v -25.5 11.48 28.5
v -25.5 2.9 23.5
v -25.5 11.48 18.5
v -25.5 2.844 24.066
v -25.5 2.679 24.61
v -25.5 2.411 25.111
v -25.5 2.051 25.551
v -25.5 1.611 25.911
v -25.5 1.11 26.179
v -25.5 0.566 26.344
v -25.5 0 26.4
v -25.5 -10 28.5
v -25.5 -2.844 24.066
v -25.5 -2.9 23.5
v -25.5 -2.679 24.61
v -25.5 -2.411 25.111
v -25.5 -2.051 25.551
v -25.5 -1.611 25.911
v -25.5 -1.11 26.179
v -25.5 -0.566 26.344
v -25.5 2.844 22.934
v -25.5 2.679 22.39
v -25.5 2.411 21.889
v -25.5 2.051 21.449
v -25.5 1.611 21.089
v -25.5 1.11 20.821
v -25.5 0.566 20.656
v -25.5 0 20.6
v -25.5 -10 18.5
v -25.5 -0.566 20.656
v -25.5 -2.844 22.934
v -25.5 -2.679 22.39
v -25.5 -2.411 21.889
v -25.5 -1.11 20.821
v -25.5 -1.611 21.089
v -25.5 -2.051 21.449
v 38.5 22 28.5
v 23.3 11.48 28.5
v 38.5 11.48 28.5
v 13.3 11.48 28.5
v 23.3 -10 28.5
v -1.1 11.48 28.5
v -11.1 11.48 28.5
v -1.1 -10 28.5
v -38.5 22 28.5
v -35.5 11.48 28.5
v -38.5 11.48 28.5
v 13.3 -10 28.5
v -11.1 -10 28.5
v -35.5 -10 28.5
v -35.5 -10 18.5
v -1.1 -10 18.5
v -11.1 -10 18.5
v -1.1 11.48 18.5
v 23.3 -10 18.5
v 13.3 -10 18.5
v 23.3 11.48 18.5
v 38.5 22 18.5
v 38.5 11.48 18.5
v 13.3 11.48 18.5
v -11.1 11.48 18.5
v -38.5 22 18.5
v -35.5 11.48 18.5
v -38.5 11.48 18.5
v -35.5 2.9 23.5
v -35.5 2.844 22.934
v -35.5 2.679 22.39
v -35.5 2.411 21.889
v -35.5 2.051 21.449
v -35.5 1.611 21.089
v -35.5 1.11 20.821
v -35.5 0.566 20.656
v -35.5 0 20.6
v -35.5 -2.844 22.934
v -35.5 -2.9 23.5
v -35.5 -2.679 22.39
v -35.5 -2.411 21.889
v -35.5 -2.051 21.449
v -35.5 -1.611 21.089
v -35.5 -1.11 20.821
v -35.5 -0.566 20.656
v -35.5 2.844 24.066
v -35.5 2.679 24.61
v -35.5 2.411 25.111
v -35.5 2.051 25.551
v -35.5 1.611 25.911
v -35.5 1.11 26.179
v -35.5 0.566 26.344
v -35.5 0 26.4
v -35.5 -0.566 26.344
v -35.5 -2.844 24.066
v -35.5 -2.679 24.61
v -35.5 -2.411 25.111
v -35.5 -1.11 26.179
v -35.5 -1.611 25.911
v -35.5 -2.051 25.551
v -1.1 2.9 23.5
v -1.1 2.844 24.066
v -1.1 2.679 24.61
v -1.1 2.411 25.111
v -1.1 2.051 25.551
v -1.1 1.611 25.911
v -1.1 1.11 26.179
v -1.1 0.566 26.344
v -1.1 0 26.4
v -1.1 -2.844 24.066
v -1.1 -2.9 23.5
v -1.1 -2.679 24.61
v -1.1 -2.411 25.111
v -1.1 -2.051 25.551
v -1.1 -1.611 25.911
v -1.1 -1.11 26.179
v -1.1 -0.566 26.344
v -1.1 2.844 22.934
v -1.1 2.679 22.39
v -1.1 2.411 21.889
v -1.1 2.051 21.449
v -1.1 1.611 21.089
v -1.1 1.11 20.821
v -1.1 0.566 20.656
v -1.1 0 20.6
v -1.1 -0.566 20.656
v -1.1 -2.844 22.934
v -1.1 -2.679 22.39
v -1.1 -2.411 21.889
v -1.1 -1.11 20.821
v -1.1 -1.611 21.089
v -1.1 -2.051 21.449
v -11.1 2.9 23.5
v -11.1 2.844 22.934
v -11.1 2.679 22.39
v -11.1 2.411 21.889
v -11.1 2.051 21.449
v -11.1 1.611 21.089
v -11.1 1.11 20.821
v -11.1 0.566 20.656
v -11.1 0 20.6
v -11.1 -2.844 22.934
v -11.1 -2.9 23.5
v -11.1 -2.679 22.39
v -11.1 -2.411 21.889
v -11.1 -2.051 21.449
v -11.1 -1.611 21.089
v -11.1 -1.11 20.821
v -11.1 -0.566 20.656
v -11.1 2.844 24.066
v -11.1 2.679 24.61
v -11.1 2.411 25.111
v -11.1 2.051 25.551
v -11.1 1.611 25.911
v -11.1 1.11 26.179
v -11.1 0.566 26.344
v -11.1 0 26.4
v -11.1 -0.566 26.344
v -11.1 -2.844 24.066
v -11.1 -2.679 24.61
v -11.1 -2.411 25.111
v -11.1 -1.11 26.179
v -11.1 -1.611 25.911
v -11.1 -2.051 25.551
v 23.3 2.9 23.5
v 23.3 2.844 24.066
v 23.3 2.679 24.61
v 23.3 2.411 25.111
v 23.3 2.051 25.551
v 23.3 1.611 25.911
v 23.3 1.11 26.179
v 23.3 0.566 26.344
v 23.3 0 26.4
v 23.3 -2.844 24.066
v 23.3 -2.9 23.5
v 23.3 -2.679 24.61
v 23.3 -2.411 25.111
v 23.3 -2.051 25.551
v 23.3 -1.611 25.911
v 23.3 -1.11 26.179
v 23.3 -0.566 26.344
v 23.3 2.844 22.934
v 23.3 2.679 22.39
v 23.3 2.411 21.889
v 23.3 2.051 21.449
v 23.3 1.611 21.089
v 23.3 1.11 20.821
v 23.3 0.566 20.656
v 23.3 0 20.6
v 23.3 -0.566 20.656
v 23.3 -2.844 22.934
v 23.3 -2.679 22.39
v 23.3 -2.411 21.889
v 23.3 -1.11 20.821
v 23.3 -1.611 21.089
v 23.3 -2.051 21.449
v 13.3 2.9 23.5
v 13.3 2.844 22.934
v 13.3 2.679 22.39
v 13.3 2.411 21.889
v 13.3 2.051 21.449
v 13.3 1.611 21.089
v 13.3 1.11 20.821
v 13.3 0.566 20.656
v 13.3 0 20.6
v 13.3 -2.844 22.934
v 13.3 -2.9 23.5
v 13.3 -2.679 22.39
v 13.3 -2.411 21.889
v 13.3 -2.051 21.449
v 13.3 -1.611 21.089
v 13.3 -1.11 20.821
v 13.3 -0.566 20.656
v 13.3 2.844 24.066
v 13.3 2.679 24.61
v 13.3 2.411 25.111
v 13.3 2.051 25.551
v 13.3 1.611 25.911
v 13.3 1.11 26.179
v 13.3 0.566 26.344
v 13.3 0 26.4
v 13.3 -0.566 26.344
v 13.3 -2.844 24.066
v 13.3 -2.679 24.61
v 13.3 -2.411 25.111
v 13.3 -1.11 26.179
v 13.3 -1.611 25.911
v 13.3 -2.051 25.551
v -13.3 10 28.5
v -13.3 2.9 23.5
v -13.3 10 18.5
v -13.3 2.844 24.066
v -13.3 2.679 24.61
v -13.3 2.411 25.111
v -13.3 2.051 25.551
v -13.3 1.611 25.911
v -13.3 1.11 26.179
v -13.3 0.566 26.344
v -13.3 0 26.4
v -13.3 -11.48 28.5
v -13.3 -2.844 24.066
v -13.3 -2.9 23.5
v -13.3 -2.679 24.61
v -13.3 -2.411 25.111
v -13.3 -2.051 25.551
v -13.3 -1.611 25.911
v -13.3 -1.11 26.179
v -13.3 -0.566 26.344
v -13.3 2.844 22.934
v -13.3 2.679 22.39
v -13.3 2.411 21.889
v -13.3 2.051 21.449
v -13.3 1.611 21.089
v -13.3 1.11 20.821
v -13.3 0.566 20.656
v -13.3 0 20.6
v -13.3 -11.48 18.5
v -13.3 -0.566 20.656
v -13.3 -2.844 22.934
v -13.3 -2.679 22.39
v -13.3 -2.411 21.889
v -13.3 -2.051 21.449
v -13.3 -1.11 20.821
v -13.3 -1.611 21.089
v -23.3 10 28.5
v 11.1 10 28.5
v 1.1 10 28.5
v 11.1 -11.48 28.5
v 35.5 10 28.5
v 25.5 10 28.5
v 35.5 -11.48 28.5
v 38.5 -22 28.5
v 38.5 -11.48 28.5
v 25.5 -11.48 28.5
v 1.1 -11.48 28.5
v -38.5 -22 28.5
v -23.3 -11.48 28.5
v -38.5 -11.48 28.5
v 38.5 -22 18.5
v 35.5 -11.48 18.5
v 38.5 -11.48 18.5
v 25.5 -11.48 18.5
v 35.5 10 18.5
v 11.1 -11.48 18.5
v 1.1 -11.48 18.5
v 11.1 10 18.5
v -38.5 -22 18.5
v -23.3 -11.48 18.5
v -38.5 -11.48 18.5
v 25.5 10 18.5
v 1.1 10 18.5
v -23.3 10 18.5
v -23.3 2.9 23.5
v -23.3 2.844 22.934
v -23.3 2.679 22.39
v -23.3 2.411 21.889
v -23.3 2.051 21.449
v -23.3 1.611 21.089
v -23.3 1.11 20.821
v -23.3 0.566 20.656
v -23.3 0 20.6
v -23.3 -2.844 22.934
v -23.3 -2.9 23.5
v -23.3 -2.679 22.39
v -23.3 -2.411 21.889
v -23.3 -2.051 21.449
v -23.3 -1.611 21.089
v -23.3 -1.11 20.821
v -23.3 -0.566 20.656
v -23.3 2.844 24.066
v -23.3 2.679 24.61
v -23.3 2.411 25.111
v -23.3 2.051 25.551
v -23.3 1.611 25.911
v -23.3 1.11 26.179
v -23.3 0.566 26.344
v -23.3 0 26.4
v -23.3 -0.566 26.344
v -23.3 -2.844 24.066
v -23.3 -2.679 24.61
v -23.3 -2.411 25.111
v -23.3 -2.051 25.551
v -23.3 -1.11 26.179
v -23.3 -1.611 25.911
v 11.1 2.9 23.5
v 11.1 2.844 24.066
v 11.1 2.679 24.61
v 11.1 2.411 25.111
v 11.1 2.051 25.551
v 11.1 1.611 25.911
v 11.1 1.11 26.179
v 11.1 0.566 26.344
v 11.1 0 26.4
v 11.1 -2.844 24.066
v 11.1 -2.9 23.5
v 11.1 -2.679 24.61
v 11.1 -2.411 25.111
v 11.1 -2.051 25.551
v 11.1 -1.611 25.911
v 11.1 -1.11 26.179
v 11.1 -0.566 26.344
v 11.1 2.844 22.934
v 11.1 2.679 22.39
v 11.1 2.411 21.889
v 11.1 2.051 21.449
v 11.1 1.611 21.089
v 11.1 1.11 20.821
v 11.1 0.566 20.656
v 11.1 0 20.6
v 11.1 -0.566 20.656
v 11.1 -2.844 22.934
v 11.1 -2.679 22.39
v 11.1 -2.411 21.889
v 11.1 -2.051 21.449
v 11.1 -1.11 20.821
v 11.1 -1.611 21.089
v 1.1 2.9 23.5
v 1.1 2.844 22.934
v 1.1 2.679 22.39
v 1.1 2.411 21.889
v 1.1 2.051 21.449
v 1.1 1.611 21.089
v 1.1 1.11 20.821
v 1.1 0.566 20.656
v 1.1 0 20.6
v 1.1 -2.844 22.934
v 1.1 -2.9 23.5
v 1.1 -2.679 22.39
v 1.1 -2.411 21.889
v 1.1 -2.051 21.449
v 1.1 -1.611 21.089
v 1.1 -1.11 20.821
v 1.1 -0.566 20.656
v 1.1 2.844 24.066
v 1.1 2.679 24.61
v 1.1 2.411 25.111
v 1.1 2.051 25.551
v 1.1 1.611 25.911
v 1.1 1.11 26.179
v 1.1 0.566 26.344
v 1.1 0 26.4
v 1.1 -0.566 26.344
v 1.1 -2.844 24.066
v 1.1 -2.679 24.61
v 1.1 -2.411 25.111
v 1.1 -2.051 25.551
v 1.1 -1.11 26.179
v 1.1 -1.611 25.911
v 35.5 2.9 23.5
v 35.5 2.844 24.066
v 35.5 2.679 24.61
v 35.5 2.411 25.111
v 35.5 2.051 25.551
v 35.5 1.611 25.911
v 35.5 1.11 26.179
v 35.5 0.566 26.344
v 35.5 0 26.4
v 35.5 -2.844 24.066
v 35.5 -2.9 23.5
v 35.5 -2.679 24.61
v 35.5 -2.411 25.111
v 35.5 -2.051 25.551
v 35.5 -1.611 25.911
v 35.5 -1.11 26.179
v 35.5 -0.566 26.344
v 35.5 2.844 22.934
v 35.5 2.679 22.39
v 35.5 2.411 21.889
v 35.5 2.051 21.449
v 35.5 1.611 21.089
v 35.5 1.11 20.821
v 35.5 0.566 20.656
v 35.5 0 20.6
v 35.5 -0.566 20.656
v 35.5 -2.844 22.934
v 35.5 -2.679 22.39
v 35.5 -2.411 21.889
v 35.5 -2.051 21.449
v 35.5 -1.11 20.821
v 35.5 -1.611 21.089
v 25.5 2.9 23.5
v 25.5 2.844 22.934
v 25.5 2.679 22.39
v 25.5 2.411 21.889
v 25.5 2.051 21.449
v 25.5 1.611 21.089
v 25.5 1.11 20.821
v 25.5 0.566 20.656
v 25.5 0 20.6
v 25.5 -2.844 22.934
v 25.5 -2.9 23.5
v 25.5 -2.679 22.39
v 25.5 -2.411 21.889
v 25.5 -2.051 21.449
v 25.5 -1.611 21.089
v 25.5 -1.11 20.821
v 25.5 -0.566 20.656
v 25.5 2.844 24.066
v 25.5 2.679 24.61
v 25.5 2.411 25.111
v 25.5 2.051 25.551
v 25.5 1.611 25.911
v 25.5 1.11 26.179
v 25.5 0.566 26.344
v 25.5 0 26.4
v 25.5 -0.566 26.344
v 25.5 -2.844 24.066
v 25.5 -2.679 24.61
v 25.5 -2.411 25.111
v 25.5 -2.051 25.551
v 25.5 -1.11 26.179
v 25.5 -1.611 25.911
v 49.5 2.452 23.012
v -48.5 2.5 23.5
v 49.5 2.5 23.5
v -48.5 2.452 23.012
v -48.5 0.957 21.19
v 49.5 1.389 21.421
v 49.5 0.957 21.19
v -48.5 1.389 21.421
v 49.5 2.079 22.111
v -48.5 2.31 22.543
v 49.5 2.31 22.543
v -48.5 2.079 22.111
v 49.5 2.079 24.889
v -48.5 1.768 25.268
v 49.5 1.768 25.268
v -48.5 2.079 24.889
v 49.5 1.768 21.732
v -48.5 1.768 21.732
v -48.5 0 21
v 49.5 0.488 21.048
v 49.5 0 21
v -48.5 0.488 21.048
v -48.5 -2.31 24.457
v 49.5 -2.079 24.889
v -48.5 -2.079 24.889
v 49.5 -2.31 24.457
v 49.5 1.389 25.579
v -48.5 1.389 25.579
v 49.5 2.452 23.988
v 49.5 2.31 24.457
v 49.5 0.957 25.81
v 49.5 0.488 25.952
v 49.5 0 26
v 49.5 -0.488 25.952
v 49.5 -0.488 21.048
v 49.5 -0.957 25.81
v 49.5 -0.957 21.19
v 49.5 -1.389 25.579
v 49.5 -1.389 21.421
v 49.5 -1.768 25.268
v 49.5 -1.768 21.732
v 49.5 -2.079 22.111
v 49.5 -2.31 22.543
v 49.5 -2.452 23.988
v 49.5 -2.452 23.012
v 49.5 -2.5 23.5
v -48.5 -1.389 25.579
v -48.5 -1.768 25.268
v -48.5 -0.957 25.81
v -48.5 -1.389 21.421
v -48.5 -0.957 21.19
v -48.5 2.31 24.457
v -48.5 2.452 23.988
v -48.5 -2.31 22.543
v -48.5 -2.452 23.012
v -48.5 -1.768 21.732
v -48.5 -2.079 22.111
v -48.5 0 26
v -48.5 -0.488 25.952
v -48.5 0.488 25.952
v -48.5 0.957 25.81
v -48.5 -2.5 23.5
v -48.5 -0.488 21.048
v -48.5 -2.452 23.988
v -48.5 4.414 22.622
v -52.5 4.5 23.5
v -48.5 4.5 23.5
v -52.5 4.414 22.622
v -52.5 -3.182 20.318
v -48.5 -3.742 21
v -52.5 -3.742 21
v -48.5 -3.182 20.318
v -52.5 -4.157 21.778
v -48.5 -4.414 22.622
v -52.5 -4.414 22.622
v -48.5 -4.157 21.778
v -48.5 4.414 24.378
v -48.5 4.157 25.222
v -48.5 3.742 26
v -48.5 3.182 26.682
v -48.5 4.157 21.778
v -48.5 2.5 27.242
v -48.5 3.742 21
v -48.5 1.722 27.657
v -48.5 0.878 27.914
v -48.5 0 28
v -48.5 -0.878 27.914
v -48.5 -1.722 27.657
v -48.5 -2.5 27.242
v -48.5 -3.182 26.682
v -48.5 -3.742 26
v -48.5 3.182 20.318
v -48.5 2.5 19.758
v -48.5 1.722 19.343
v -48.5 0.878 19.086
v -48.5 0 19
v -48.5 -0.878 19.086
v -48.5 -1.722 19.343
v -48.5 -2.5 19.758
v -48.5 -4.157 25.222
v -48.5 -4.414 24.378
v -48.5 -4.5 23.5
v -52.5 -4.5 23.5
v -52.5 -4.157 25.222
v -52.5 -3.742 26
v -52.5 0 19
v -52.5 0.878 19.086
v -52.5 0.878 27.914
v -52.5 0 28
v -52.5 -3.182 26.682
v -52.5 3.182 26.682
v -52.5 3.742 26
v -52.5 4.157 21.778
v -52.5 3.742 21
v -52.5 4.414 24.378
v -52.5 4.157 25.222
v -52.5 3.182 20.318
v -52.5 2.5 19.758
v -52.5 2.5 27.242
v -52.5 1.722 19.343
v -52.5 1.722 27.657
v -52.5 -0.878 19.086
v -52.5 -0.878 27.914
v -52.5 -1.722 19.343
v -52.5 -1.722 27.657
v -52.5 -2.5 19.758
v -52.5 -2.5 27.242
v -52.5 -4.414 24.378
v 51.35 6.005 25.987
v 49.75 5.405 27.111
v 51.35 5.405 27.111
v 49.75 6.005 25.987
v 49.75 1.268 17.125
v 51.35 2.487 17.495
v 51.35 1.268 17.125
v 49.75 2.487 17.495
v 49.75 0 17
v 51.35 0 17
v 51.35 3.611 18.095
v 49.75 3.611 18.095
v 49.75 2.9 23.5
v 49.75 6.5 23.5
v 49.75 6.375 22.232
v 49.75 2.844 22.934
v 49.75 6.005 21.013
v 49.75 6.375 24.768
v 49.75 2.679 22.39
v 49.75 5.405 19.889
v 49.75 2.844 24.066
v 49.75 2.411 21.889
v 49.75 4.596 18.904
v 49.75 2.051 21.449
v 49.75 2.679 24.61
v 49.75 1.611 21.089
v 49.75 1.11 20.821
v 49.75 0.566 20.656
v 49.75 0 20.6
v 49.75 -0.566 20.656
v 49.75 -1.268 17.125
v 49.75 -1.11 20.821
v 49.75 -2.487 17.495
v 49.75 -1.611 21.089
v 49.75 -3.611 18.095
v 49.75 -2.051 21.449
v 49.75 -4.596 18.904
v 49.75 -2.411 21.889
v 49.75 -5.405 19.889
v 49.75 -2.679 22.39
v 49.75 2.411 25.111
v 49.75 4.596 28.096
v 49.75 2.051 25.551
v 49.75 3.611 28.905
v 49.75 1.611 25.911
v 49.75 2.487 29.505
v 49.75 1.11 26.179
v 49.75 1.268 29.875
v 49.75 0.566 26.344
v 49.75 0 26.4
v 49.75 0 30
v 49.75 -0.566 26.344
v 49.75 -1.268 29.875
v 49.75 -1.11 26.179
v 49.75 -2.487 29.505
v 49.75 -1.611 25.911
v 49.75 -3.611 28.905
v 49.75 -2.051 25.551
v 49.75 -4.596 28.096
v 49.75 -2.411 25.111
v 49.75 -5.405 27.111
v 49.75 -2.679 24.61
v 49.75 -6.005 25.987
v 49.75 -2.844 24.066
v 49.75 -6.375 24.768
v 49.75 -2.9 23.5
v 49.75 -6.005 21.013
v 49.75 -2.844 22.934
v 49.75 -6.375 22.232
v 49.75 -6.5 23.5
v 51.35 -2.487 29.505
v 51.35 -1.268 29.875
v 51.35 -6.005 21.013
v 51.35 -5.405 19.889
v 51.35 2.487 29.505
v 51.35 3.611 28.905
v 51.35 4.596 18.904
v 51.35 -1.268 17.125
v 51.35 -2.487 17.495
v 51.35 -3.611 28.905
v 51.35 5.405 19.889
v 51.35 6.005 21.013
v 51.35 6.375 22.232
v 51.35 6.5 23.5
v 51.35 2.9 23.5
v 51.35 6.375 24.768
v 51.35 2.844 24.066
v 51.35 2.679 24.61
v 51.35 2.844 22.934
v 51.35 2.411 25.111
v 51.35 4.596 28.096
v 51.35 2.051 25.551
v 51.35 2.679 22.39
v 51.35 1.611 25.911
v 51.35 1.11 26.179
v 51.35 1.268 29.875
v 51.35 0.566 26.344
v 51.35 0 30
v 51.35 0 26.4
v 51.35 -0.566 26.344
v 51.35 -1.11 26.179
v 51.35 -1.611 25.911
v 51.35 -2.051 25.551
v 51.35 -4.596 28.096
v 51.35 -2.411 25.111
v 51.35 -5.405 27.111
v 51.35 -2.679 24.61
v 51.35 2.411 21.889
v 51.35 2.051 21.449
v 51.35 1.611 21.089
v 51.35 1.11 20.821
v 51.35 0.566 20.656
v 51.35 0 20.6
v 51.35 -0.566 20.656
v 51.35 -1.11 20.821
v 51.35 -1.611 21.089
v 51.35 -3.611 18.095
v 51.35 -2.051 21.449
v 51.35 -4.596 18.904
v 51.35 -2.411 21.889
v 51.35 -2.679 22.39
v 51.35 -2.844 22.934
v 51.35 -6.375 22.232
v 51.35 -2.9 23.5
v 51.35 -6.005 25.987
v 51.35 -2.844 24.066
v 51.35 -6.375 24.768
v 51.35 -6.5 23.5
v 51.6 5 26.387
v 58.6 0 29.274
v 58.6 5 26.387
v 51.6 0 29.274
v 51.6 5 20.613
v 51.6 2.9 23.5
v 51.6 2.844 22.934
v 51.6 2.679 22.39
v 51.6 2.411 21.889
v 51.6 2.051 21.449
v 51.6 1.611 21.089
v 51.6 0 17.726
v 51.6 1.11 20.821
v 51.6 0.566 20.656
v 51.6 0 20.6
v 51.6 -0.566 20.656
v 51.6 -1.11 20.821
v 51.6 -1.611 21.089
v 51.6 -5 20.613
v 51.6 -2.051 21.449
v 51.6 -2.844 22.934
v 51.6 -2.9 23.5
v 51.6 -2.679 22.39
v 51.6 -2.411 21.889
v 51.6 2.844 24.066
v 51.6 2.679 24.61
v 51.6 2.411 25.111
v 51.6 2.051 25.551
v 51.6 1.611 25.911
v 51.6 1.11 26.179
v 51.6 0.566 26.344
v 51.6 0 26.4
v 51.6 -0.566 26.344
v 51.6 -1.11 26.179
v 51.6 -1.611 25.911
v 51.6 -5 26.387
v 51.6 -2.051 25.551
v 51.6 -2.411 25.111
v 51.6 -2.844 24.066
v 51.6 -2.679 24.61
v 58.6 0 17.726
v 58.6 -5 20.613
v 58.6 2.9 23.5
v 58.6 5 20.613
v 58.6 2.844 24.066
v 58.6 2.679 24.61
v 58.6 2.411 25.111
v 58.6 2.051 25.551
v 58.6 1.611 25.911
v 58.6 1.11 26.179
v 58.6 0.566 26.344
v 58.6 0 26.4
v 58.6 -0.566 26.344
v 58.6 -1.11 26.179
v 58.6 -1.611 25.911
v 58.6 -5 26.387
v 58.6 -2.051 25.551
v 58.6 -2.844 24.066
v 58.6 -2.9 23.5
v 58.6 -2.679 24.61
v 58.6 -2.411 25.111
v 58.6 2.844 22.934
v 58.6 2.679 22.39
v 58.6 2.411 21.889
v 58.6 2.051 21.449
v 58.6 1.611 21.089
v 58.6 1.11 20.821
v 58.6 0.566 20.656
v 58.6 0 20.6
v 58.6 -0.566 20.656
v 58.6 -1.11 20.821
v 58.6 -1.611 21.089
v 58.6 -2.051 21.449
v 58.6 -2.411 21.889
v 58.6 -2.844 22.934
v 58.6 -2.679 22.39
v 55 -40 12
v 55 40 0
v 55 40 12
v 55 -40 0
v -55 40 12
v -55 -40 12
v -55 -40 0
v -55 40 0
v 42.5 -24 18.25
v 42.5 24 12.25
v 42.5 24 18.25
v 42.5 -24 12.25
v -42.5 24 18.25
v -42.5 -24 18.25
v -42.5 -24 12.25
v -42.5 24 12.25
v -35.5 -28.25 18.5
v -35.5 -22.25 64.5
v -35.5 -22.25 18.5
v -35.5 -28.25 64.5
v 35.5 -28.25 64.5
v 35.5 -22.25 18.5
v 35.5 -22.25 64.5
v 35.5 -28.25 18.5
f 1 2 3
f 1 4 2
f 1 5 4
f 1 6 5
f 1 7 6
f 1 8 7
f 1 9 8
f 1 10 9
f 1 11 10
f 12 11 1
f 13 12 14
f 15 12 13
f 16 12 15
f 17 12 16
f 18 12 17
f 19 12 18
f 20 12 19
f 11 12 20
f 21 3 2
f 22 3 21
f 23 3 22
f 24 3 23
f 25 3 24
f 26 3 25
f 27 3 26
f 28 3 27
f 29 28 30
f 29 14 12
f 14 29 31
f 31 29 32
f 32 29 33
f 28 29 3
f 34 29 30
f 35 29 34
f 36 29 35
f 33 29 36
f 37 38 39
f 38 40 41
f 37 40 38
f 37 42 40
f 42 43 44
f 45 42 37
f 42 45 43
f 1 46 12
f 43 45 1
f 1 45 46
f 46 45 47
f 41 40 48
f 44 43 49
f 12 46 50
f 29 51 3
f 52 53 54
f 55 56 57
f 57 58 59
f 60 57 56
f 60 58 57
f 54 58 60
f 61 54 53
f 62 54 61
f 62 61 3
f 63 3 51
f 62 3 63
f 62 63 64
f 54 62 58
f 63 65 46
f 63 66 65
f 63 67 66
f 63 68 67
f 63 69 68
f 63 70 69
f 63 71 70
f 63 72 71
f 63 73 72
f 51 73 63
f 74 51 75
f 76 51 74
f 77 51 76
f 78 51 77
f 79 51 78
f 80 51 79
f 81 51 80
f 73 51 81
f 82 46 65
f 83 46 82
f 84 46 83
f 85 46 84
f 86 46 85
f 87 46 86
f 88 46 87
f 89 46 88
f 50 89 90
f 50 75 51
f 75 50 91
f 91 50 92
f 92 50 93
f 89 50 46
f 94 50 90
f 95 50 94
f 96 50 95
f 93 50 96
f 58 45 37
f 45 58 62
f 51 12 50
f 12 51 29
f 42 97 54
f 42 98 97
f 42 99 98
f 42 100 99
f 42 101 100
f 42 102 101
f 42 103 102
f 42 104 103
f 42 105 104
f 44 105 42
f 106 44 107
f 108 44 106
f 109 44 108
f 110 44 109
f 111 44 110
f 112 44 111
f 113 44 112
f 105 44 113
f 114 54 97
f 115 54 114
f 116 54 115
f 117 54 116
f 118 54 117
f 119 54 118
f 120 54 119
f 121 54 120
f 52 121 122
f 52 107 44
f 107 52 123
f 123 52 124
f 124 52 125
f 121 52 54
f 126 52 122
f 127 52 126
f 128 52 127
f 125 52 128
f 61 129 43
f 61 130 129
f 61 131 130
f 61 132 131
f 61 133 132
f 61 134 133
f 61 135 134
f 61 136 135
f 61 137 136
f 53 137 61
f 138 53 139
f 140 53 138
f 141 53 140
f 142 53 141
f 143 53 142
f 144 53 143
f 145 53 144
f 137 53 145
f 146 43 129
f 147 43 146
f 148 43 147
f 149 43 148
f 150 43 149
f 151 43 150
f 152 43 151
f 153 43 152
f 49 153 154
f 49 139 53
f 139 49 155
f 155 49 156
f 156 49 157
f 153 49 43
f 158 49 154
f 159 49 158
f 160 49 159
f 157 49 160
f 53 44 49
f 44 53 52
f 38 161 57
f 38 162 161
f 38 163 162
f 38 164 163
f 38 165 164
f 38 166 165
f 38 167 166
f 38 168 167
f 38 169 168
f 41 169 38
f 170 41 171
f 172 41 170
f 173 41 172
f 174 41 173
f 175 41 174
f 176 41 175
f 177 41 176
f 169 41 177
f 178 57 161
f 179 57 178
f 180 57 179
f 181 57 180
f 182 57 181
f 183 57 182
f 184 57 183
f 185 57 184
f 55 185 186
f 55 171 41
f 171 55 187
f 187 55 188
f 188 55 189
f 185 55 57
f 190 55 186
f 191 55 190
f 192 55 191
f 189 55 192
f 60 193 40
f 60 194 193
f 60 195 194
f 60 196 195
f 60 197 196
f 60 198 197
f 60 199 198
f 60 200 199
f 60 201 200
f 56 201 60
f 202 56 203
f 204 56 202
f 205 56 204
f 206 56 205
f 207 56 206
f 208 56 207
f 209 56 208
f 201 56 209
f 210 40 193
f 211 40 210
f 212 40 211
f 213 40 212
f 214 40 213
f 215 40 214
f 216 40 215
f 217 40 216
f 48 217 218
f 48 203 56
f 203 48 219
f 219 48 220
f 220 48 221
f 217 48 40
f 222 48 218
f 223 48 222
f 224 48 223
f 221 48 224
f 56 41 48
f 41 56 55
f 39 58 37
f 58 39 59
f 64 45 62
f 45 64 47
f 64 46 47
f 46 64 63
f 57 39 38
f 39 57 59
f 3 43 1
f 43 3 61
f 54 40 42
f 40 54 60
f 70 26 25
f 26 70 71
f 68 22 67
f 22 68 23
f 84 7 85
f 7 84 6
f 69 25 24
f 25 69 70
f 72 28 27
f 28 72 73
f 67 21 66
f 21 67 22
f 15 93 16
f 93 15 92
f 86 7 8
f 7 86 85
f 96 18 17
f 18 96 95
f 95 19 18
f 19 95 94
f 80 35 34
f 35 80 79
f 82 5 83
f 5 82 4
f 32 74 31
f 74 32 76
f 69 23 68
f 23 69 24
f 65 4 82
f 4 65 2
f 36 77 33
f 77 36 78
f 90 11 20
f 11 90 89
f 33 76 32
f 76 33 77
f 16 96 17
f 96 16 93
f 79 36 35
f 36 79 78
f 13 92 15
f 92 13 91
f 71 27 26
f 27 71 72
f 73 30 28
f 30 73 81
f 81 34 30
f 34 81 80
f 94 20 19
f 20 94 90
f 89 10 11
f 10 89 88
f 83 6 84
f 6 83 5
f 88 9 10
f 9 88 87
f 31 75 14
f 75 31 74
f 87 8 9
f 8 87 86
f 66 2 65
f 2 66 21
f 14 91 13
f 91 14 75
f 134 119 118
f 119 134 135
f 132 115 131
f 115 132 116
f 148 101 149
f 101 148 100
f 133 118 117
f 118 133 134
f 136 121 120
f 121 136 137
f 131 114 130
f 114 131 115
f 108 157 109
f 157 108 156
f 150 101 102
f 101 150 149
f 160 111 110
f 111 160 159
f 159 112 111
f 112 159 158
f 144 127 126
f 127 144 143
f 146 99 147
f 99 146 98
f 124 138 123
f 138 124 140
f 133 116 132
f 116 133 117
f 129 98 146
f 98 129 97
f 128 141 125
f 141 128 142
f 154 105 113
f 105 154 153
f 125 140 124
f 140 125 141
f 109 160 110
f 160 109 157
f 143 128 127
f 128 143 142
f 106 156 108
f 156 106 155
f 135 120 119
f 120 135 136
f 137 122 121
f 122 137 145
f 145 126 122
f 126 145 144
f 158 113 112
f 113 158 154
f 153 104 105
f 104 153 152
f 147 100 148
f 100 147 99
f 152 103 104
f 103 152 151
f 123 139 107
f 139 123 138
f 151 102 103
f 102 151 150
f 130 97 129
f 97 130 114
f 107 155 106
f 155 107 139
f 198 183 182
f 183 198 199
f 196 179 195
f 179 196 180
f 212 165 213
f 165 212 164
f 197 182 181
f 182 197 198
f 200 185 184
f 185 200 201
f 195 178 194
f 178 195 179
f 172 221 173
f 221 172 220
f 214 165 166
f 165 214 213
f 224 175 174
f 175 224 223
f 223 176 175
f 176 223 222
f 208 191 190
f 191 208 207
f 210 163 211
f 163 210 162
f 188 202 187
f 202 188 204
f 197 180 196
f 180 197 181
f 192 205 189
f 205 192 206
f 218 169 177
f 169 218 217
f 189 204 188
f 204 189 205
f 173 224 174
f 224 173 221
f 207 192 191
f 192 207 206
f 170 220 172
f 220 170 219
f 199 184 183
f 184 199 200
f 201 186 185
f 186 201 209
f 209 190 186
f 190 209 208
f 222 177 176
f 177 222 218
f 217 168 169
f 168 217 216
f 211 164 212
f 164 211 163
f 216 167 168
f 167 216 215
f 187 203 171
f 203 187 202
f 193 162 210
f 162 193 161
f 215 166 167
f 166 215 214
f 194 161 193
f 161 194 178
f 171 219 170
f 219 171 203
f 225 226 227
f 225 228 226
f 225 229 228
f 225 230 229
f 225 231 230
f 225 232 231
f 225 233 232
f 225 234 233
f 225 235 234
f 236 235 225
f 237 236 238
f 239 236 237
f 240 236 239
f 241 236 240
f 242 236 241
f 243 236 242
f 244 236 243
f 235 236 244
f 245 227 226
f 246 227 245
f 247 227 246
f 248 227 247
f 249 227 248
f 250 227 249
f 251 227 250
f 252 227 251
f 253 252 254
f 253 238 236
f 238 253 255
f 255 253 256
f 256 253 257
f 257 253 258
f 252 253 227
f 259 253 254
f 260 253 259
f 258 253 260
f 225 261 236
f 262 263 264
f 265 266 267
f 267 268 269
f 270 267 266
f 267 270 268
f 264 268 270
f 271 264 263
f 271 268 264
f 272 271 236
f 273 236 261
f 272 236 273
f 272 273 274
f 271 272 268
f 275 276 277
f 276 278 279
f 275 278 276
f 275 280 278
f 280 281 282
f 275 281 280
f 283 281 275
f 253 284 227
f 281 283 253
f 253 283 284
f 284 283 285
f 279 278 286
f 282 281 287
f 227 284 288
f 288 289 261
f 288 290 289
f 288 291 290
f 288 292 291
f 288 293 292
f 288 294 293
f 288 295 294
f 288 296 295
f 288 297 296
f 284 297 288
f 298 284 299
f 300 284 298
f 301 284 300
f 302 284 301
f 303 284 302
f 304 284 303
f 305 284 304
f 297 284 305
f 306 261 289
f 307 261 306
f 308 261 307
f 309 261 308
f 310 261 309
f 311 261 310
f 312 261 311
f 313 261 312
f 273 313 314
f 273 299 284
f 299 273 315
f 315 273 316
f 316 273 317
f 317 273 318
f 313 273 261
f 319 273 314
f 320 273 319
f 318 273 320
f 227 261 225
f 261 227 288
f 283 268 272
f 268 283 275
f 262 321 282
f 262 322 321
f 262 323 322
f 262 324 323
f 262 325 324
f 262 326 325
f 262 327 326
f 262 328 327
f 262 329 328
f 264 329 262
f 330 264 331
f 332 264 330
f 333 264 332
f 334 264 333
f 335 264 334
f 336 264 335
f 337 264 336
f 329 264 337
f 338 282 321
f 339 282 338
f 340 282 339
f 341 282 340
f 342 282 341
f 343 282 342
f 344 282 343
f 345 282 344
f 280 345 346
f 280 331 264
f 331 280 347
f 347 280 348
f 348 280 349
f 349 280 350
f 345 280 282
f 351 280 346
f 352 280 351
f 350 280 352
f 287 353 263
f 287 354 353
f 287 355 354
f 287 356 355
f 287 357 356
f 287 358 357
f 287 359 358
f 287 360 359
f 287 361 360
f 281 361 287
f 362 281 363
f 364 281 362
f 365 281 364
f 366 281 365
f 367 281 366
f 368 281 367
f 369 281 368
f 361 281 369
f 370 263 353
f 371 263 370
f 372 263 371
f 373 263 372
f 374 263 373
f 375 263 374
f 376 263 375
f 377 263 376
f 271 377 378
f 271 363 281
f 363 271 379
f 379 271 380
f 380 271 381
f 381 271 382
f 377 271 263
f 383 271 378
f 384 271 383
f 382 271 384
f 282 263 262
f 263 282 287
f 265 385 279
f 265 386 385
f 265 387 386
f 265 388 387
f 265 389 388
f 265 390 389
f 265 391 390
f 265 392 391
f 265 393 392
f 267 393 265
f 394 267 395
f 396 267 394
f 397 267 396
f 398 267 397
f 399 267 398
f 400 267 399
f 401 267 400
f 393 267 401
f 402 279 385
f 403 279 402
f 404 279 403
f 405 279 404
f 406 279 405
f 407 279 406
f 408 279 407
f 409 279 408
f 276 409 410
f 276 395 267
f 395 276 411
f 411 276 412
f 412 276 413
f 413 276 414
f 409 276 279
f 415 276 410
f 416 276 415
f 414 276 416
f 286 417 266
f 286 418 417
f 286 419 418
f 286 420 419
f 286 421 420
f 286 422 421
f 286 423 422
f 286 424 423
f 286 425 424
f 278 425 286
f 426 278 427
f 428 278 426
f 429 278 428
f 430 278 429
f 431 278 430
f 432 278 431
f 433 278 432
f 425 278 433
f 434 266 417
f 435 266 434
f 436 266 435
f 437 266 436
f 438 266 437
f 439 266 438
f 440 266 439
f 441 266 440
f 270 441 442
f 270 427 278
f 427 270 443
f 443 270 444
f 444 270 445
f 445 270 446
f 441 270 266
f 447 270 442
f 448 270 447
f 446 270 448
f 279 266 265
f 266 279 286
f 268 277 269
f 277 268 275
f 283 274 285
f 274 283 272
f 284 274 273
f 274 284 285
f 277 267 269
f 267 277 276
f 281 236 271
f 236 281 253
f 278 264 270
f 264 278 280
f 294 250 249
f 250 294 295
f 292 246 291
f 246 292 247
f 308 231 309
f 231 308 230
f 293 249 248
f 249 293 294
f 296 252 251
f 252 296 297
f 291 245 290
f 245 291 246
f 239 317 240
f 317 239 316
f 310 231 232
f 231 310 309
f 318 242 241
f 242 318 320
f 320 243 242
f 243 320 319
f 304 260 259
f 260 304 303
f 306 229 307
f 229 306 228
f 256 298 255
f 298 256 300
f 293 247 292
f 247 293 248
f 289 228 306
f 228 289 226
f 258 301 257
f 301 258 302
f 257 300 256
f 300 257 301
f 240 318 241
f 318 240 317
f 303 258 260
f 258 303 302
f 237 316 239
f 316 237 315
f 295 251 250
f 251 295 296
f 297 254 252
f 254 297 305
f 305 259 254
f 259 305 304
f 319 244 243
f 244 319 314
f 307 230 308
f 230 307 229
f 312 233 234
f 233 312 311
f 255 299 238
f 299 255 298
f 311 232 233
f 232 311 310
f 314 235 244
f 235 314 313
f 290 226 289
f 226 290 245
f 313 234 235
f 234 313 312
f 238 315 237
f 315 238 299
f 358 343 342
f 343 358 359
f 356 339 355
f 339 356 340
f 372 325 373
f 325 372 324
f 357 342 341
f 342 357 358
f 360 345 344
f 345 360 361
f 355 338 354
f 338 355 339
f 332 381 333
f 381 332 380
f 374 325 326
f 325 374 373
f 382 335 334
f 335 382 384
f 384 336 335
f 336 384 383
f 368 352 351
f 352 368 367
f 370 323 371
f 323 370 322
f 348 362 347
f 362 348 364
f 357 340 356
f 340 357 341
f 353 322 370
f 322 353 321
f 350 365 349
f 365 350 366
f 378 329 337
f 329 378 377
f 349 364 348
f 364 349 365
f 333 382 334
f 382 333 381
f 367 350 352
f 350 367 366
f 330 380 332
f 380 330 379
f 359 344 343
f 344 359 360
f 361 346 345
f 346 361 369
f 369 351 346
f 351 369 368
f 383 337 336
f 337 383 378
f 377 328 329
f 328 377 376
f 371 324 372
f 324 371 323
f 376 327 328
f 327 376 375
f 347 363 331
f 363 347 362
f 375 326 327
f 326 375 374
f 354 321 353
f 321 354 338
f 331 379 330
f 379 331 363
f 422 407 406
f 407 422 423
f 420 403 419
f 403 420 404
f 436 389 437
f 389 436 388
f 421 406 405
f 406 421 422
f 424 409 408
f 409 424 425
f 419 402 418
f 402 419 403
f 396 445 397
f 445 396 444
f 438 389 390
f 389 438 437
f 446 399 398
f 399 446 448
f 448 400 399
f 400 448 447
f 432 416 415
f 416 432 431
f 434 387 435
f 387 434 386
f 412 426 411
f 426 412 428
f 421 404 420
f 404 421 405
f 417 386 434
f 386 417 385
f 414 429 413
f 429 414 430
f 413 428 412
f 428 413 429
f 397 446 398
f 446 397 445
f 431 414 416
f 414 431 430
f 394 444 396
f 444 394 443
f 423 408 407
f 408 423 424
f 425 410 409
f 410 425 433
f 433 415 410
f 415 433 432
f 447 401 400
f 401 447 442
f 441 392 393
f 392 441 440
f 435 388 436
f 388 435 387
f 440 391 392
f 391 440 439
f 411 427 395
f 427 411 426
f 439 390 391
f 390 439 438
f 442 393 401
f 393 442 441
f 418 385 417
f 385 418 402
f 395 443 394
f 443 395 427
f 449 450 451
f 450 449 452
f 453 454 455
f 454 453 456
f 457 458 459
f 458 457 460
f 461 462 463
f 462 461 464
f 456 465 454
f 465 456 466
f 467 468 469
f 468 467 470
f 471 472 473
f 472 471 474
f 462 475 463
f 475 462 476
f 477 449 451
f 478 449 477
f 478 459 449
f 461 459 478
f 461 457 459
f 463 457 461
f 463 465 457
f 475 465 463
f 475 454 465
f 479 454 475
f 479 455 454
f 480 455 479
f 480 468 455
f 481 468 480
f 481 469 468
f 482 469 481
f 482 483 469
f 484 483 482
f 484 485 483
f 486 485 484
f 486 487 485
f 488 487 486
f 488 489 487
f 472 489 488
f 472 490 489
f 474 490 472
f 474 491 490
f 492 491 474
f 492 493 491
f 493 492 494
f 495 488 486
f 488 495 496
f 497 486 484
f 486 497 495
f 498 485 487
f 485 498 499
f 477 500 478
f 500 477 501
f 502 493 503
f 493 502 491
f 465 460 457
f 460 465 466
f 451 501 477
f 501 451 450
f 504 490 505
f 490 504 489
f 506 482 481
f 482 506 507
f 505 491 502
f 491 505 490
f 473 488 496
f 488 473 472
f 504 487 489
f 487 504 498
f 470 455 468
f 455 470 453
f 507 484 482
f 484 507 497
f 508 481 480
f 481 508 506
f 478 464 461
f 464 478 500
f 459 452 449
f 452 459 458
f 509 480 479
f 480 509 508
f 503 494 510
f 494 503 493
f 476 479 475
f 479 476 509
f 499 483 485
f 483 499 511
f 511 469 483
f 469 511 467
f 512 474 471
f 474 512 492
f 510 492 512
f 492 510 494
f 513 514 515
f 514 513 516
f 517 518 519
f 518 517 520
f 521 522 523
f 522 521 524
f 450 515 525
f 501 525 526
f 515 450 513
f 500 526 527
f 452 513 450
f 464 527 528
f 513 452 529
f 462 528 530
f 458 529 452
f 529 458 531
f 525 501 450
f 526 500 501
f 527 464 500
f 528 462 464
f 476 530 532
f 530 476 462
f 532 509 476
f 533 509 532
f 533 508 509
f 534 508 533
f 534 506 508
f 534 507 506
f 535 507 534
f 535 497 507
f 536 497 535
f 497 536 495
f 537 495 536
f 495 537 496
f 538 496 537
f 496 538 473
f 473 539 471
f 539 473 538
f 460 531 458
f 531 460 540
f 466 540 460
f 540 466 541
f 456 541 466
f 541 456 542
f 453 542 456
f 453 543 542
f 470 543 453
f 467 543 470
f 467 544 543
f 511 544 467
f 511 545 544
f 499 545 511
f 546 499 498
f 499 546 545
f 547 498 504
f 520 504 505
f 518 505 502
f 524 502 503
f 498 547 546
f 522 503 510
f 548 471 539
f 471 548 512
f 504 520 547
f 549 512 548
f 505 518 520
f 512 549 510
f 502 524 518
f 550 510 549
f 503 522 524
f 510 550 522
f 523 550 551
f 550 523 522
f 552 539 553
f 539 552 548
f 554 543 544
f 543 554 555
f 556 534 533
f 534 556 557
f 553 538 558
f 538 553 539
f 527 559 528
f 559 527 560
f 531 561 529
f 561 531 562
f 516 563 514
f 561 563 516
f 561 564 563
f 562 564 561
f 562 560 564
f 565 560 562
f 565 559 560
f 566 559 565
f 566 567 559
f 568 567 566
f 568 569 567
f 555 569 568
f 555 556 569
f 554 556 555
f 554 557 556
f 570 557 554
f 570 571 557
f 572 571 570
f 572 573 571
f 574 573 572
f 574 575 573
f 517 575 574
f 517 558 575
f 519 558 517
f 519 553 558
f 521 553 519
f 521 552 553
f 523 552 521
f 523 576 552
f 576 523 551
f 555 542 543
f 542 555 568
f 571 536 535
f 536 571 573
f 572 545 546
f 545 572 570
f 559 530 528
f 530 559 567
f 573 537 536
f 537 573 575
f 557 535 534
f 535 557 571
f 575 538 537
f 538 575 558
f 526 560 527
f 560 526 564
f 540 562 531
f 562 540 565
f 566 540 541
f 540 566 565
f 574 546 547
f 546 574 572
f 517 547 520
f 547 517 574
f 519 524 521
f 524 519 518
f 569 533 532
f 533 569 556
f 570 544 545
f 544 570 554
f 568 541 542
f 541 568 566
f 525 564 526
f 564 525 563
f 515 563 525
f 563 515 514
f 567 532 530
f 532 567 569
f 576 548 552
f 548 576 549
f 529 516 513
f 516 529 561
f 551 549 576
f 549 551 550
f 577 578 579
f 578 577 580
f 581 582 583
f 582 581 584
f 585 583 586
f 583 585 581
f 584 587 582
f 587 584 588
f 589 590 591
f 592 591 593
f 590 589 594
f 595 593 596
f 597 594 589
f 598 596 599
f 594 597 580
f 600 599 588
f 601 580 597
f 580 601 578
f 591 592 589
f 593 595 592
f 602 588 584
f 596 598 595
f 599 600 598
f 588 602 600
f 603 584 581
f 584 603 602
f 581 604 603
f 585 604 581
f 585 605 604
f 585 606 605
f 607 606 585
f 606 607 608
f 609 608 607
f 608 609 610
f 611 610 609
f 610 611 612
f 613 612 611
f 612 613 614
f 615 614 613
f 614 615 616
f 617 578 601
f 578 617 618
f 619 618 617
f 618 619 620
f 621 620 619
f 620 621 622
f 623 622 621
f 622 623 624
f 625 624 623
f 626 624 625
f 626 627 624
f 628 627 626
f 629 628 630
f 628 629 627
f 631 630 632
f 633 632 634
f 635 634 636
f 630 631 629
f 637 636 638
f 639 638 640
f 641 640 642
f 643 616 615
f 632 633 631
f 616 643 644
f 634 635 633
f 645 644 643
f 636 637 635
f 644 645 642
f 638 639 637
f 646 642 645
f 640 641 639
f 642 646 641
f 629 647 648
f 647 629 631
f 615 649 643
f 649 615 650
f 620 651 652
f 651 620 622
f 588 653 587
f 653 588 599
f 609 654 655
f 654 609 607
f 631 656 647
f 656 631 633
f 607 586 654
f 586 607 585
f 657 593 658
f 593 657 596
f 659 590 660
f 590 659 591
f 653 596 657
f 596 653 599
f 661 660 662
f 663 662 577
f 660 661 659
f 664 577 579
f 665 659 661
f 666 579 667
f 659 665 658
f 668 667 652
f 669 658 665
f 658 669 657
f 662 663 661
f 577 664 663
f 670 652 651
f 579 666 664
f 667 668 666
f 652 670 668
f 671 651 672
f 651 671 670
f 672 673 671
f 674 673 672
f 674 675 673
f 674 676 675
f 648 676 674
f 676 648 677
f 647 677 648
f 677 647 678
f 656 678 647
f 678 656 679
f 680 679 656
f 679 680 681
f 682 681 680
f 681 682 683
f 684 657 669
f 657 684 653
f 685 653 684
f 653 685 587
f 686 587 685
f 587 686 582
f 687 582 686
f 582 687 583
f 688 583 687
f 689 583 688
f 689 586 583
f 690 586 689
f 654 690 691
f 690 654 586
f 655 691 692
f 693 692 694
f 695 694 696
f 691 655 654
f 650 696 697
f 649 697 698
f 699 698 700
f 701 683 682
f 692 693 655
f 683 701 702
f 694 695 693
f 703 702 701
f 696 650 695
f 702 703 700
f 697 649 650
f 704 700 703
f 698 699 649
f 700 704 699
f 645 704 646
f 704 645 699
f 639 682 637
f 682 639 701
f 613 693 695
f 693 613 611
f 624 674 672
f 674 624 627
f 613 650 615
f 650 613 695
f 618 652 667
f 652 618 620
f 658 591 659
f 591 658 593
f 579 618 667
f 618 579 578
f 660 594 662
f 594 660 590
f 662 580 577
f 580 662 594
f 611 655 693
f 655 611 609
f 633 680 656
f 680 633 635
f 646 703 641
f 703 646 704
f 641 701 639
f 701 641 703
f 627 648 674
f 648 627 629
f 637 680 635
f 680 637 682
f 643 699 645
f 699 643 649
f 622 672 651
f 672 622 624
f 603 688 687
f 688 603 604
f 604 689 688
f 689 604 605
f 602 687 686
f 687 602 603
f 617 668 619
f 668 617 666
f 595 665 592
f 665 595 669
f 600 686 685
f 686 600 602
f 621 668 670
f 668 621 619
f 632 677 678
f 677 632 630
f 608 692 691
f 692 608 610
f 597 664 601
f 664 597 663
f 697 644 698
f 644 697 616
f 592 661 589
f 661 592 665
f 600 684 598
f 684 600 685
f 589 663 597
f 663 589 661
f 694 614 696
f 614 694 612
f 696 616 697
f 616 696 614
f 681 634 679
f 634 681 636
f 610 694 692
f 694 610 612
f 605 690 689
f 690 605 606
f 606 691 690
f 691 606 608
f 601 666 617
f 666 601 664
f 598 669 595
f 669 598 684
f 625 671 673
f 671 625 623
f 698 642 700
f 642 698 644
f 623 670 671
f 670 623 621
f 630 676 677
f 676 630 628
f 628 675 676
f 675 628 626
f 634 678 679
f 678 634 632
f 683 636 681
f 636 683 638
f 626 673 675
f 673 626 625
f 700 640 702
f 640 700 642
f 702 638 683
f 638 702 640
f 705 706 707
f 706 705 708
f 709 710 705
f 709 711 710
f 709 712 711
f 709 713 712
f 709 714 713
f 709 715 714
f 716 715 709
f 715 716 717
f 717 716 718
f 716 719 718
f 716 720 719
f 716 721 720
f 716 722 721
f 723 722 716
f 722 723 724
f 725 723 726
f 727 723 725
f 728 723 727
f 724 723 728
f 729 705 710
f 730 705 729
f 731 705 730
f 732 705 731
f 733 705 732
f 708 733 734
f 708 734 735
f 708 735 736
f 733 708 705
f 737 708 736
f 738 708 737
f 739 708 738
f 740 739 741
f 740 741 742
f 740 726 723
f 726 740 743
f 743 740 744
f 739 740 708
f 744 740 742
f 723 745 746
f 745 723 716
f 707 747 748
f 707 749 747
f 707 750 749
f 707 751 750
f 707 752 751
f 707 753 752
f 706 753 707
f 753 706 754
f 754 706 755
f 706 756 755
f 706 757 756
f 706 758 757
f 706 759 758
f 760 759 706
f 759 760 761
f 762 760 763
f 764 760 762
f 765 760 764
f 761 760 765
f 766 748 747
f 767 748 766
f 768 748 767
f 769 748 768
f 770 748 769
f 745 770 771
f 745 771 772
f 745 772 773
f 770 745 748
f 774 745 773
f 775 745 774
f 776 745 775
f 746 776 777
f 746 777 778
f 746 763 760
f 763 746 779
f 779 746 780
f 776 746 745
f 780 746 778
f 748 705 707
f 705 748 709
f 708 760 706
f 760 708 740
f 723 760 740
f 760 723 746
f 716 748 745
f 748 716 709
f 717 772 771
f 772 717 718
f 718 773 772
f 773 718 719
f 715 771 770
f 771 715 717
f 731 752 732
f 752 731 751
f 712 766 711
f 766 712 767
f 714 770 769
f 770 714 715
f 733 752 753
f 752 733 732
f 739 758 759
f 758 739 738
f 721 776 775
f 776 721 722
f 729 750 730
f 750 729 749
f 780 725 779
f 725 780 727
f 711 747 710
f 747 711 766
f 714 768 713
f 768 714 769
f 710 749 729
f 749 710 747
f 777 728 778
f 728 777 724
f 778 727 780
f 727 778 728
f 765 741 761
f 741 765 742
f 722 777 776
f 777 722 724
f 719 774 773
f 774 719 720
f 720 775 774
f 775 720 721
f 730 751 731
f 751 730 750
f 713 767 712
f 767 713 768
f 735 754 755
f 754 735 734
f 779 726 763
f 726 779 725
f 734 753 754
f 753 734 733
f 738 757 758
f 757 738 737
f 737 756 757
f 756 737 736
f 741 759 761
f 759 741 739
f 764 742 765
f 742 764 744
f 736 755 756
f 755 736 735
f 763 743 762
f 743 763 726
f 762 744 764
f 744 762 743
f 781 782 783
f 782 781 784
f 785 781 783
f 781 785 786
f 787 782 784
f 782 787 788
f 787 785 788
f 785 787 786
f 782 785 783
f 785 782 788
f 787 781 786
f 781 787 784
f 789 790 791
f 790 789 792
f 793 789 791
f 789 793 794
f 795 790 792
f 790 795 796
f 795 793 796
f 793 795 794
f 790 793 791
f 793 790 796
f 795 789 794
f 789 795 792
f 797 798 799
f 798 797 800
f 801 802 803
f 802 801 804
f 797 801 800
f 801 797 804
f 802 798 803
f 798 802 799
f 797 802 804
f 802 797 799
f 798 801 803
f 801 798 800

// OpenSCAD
$fn = 32;

// ------------------------------------------------------------------------
// Comb hinge with flap: leaf 77 x 22 mm, pin d5, flap 46 mm
// Every part is its own module, assembly() places every instance.
// ------------------------------------------------------------------------

// --- part 1 ---
module hinge_bed() {
  difference() {
    translate([-55, -40, 0]) cube([110, 80, 12]);
  }
}

// --- part 2 ---
module hinge_riser() {
  difference() {
    translate([-42.5, -24, 0]) cube([85, 48, 6]);
  }
}

// --- part 3 ---
module hinge_leaf_a() {
  difference() {
    union() {
      translate([-35.5, -10, -5]) cube([10, 32, 10]);
      translate([-11.1, -10, -5]) cube([10, 32, 10]);
      translate([13.3, -10, -5]) cube([10, 32, 10]);
      translate([-38.5, 11.48, -5]) cube([77, 10.52, 10]);
    }
    translate([-30.5, 0, 0]) rotate([0, 90, 0]) cylinder(h = 12, d = 5.8, center = true);
    translate([-6.1, 0, 0]) rotate([0, 90, 0]) cylinder(h = 12, d = 5.8, center = true);
    translate([18.3, 0, 0]) rotate([0, 90, 0]) cylinder(h = 12, d = 5.8, center = true);
  }
}

// --- part 4 ---
module hinge_leaf_b() {
  difference() {
    union() {
      translate([-23.3, -22, -5]) cube([10, 32, 10]);
      translate([1.1, -22, -5]) cube([10, 32, 10]);
      translate([25.5, -22, -5]) cube([10, 32, 10]);
      translate([-38.5, -22, -5]) cube([77, 10.52, 10]);
    }
    translate([-18.3, 0, 0]) rotate([0, 90, 0]) cylinder(h = 12, d = 5.8, center = true);
    translate([6.1, 0, 0]) rotate([0, 90, 0]) cylinder(h = 12, d = 5.8, center = true);
    translate([30.5, 0, 0]) rotate([0, 90, 0]) cylinder(h = 12, d = 5.8, center = true);
  }
}

// --- part 5 ---
module hinge_flap() {
  difference() {
    translate([-35.5, -23, 0]) cube([71, 46, 6]);
  }
}

// --- part 6 ---
module hinge_pin() {
  rotate([0, 90, 0]) cylinder(h = 99, d = 5, center = true);
  translate([-52.5, 0, 0]) rotate([0, 90, 0]) cylinder(h = 4, d = 9);
}

// --- part 7 ---
module pin_washer() {
  difference() {
      translate([0, 0, 0]) cylinder(h = 1.6, d = 13);
      translate([0, 0, -1]) cylinder(h = 3.6, d = 5.8);
    }
}

// --- part 8 ---
module pin_nut() {
  difference() {
    linear_extrude(height = 7) polygon(points = [[5.774, 0], [2.887, 5], [-2.887, 5], [-5.774, 0], [-2.887, -5], [2.887, -5]]);
    translate([0, 0, -1]) cylinder(h = 9, d = 5.8);
  }
}

// --- assembly ---
module assembly() {
  color([0.80, 0.24, 0.20]) translate([0, 0, 0]) rotate([0, 0, 0]) hinge_bed();
  color([0.20, 0.45, 0.75]) translate([0, 0, 12.25]) rotate([0, 0, 0]) hinge_riser();
  color([0.25, 0.62, 0.32]) translate([0, 0, 23.5]) rotate([0, 0, 0]) hinge_leaf_a();
  color([0.92, 0.70, 0.18]) translate([0, 0, 23.5]) rotate([0, 0, 0]) hinge_leaf_b();
  color([0.58, 0.35, 0.70]) translate([0, -22.25, 41.5]) rotate([90, 0, 0]) hinge_flap();
  color([0.16, 0.66, 0.66]) translate([0, 0, 23.5]) rotate([0, 0, 0]) hinge_pin();
  color([0.85, 0.48, 0.18]) translate([49.75, 0, 23.5]) rotate([0, 90, 0]) pin_washer();
  color([0.55, 0.60, 0.65]) translate([51.6, 0, 23.5]) rotate([0, 90, 0]) pin_nut();
}

assembly();
